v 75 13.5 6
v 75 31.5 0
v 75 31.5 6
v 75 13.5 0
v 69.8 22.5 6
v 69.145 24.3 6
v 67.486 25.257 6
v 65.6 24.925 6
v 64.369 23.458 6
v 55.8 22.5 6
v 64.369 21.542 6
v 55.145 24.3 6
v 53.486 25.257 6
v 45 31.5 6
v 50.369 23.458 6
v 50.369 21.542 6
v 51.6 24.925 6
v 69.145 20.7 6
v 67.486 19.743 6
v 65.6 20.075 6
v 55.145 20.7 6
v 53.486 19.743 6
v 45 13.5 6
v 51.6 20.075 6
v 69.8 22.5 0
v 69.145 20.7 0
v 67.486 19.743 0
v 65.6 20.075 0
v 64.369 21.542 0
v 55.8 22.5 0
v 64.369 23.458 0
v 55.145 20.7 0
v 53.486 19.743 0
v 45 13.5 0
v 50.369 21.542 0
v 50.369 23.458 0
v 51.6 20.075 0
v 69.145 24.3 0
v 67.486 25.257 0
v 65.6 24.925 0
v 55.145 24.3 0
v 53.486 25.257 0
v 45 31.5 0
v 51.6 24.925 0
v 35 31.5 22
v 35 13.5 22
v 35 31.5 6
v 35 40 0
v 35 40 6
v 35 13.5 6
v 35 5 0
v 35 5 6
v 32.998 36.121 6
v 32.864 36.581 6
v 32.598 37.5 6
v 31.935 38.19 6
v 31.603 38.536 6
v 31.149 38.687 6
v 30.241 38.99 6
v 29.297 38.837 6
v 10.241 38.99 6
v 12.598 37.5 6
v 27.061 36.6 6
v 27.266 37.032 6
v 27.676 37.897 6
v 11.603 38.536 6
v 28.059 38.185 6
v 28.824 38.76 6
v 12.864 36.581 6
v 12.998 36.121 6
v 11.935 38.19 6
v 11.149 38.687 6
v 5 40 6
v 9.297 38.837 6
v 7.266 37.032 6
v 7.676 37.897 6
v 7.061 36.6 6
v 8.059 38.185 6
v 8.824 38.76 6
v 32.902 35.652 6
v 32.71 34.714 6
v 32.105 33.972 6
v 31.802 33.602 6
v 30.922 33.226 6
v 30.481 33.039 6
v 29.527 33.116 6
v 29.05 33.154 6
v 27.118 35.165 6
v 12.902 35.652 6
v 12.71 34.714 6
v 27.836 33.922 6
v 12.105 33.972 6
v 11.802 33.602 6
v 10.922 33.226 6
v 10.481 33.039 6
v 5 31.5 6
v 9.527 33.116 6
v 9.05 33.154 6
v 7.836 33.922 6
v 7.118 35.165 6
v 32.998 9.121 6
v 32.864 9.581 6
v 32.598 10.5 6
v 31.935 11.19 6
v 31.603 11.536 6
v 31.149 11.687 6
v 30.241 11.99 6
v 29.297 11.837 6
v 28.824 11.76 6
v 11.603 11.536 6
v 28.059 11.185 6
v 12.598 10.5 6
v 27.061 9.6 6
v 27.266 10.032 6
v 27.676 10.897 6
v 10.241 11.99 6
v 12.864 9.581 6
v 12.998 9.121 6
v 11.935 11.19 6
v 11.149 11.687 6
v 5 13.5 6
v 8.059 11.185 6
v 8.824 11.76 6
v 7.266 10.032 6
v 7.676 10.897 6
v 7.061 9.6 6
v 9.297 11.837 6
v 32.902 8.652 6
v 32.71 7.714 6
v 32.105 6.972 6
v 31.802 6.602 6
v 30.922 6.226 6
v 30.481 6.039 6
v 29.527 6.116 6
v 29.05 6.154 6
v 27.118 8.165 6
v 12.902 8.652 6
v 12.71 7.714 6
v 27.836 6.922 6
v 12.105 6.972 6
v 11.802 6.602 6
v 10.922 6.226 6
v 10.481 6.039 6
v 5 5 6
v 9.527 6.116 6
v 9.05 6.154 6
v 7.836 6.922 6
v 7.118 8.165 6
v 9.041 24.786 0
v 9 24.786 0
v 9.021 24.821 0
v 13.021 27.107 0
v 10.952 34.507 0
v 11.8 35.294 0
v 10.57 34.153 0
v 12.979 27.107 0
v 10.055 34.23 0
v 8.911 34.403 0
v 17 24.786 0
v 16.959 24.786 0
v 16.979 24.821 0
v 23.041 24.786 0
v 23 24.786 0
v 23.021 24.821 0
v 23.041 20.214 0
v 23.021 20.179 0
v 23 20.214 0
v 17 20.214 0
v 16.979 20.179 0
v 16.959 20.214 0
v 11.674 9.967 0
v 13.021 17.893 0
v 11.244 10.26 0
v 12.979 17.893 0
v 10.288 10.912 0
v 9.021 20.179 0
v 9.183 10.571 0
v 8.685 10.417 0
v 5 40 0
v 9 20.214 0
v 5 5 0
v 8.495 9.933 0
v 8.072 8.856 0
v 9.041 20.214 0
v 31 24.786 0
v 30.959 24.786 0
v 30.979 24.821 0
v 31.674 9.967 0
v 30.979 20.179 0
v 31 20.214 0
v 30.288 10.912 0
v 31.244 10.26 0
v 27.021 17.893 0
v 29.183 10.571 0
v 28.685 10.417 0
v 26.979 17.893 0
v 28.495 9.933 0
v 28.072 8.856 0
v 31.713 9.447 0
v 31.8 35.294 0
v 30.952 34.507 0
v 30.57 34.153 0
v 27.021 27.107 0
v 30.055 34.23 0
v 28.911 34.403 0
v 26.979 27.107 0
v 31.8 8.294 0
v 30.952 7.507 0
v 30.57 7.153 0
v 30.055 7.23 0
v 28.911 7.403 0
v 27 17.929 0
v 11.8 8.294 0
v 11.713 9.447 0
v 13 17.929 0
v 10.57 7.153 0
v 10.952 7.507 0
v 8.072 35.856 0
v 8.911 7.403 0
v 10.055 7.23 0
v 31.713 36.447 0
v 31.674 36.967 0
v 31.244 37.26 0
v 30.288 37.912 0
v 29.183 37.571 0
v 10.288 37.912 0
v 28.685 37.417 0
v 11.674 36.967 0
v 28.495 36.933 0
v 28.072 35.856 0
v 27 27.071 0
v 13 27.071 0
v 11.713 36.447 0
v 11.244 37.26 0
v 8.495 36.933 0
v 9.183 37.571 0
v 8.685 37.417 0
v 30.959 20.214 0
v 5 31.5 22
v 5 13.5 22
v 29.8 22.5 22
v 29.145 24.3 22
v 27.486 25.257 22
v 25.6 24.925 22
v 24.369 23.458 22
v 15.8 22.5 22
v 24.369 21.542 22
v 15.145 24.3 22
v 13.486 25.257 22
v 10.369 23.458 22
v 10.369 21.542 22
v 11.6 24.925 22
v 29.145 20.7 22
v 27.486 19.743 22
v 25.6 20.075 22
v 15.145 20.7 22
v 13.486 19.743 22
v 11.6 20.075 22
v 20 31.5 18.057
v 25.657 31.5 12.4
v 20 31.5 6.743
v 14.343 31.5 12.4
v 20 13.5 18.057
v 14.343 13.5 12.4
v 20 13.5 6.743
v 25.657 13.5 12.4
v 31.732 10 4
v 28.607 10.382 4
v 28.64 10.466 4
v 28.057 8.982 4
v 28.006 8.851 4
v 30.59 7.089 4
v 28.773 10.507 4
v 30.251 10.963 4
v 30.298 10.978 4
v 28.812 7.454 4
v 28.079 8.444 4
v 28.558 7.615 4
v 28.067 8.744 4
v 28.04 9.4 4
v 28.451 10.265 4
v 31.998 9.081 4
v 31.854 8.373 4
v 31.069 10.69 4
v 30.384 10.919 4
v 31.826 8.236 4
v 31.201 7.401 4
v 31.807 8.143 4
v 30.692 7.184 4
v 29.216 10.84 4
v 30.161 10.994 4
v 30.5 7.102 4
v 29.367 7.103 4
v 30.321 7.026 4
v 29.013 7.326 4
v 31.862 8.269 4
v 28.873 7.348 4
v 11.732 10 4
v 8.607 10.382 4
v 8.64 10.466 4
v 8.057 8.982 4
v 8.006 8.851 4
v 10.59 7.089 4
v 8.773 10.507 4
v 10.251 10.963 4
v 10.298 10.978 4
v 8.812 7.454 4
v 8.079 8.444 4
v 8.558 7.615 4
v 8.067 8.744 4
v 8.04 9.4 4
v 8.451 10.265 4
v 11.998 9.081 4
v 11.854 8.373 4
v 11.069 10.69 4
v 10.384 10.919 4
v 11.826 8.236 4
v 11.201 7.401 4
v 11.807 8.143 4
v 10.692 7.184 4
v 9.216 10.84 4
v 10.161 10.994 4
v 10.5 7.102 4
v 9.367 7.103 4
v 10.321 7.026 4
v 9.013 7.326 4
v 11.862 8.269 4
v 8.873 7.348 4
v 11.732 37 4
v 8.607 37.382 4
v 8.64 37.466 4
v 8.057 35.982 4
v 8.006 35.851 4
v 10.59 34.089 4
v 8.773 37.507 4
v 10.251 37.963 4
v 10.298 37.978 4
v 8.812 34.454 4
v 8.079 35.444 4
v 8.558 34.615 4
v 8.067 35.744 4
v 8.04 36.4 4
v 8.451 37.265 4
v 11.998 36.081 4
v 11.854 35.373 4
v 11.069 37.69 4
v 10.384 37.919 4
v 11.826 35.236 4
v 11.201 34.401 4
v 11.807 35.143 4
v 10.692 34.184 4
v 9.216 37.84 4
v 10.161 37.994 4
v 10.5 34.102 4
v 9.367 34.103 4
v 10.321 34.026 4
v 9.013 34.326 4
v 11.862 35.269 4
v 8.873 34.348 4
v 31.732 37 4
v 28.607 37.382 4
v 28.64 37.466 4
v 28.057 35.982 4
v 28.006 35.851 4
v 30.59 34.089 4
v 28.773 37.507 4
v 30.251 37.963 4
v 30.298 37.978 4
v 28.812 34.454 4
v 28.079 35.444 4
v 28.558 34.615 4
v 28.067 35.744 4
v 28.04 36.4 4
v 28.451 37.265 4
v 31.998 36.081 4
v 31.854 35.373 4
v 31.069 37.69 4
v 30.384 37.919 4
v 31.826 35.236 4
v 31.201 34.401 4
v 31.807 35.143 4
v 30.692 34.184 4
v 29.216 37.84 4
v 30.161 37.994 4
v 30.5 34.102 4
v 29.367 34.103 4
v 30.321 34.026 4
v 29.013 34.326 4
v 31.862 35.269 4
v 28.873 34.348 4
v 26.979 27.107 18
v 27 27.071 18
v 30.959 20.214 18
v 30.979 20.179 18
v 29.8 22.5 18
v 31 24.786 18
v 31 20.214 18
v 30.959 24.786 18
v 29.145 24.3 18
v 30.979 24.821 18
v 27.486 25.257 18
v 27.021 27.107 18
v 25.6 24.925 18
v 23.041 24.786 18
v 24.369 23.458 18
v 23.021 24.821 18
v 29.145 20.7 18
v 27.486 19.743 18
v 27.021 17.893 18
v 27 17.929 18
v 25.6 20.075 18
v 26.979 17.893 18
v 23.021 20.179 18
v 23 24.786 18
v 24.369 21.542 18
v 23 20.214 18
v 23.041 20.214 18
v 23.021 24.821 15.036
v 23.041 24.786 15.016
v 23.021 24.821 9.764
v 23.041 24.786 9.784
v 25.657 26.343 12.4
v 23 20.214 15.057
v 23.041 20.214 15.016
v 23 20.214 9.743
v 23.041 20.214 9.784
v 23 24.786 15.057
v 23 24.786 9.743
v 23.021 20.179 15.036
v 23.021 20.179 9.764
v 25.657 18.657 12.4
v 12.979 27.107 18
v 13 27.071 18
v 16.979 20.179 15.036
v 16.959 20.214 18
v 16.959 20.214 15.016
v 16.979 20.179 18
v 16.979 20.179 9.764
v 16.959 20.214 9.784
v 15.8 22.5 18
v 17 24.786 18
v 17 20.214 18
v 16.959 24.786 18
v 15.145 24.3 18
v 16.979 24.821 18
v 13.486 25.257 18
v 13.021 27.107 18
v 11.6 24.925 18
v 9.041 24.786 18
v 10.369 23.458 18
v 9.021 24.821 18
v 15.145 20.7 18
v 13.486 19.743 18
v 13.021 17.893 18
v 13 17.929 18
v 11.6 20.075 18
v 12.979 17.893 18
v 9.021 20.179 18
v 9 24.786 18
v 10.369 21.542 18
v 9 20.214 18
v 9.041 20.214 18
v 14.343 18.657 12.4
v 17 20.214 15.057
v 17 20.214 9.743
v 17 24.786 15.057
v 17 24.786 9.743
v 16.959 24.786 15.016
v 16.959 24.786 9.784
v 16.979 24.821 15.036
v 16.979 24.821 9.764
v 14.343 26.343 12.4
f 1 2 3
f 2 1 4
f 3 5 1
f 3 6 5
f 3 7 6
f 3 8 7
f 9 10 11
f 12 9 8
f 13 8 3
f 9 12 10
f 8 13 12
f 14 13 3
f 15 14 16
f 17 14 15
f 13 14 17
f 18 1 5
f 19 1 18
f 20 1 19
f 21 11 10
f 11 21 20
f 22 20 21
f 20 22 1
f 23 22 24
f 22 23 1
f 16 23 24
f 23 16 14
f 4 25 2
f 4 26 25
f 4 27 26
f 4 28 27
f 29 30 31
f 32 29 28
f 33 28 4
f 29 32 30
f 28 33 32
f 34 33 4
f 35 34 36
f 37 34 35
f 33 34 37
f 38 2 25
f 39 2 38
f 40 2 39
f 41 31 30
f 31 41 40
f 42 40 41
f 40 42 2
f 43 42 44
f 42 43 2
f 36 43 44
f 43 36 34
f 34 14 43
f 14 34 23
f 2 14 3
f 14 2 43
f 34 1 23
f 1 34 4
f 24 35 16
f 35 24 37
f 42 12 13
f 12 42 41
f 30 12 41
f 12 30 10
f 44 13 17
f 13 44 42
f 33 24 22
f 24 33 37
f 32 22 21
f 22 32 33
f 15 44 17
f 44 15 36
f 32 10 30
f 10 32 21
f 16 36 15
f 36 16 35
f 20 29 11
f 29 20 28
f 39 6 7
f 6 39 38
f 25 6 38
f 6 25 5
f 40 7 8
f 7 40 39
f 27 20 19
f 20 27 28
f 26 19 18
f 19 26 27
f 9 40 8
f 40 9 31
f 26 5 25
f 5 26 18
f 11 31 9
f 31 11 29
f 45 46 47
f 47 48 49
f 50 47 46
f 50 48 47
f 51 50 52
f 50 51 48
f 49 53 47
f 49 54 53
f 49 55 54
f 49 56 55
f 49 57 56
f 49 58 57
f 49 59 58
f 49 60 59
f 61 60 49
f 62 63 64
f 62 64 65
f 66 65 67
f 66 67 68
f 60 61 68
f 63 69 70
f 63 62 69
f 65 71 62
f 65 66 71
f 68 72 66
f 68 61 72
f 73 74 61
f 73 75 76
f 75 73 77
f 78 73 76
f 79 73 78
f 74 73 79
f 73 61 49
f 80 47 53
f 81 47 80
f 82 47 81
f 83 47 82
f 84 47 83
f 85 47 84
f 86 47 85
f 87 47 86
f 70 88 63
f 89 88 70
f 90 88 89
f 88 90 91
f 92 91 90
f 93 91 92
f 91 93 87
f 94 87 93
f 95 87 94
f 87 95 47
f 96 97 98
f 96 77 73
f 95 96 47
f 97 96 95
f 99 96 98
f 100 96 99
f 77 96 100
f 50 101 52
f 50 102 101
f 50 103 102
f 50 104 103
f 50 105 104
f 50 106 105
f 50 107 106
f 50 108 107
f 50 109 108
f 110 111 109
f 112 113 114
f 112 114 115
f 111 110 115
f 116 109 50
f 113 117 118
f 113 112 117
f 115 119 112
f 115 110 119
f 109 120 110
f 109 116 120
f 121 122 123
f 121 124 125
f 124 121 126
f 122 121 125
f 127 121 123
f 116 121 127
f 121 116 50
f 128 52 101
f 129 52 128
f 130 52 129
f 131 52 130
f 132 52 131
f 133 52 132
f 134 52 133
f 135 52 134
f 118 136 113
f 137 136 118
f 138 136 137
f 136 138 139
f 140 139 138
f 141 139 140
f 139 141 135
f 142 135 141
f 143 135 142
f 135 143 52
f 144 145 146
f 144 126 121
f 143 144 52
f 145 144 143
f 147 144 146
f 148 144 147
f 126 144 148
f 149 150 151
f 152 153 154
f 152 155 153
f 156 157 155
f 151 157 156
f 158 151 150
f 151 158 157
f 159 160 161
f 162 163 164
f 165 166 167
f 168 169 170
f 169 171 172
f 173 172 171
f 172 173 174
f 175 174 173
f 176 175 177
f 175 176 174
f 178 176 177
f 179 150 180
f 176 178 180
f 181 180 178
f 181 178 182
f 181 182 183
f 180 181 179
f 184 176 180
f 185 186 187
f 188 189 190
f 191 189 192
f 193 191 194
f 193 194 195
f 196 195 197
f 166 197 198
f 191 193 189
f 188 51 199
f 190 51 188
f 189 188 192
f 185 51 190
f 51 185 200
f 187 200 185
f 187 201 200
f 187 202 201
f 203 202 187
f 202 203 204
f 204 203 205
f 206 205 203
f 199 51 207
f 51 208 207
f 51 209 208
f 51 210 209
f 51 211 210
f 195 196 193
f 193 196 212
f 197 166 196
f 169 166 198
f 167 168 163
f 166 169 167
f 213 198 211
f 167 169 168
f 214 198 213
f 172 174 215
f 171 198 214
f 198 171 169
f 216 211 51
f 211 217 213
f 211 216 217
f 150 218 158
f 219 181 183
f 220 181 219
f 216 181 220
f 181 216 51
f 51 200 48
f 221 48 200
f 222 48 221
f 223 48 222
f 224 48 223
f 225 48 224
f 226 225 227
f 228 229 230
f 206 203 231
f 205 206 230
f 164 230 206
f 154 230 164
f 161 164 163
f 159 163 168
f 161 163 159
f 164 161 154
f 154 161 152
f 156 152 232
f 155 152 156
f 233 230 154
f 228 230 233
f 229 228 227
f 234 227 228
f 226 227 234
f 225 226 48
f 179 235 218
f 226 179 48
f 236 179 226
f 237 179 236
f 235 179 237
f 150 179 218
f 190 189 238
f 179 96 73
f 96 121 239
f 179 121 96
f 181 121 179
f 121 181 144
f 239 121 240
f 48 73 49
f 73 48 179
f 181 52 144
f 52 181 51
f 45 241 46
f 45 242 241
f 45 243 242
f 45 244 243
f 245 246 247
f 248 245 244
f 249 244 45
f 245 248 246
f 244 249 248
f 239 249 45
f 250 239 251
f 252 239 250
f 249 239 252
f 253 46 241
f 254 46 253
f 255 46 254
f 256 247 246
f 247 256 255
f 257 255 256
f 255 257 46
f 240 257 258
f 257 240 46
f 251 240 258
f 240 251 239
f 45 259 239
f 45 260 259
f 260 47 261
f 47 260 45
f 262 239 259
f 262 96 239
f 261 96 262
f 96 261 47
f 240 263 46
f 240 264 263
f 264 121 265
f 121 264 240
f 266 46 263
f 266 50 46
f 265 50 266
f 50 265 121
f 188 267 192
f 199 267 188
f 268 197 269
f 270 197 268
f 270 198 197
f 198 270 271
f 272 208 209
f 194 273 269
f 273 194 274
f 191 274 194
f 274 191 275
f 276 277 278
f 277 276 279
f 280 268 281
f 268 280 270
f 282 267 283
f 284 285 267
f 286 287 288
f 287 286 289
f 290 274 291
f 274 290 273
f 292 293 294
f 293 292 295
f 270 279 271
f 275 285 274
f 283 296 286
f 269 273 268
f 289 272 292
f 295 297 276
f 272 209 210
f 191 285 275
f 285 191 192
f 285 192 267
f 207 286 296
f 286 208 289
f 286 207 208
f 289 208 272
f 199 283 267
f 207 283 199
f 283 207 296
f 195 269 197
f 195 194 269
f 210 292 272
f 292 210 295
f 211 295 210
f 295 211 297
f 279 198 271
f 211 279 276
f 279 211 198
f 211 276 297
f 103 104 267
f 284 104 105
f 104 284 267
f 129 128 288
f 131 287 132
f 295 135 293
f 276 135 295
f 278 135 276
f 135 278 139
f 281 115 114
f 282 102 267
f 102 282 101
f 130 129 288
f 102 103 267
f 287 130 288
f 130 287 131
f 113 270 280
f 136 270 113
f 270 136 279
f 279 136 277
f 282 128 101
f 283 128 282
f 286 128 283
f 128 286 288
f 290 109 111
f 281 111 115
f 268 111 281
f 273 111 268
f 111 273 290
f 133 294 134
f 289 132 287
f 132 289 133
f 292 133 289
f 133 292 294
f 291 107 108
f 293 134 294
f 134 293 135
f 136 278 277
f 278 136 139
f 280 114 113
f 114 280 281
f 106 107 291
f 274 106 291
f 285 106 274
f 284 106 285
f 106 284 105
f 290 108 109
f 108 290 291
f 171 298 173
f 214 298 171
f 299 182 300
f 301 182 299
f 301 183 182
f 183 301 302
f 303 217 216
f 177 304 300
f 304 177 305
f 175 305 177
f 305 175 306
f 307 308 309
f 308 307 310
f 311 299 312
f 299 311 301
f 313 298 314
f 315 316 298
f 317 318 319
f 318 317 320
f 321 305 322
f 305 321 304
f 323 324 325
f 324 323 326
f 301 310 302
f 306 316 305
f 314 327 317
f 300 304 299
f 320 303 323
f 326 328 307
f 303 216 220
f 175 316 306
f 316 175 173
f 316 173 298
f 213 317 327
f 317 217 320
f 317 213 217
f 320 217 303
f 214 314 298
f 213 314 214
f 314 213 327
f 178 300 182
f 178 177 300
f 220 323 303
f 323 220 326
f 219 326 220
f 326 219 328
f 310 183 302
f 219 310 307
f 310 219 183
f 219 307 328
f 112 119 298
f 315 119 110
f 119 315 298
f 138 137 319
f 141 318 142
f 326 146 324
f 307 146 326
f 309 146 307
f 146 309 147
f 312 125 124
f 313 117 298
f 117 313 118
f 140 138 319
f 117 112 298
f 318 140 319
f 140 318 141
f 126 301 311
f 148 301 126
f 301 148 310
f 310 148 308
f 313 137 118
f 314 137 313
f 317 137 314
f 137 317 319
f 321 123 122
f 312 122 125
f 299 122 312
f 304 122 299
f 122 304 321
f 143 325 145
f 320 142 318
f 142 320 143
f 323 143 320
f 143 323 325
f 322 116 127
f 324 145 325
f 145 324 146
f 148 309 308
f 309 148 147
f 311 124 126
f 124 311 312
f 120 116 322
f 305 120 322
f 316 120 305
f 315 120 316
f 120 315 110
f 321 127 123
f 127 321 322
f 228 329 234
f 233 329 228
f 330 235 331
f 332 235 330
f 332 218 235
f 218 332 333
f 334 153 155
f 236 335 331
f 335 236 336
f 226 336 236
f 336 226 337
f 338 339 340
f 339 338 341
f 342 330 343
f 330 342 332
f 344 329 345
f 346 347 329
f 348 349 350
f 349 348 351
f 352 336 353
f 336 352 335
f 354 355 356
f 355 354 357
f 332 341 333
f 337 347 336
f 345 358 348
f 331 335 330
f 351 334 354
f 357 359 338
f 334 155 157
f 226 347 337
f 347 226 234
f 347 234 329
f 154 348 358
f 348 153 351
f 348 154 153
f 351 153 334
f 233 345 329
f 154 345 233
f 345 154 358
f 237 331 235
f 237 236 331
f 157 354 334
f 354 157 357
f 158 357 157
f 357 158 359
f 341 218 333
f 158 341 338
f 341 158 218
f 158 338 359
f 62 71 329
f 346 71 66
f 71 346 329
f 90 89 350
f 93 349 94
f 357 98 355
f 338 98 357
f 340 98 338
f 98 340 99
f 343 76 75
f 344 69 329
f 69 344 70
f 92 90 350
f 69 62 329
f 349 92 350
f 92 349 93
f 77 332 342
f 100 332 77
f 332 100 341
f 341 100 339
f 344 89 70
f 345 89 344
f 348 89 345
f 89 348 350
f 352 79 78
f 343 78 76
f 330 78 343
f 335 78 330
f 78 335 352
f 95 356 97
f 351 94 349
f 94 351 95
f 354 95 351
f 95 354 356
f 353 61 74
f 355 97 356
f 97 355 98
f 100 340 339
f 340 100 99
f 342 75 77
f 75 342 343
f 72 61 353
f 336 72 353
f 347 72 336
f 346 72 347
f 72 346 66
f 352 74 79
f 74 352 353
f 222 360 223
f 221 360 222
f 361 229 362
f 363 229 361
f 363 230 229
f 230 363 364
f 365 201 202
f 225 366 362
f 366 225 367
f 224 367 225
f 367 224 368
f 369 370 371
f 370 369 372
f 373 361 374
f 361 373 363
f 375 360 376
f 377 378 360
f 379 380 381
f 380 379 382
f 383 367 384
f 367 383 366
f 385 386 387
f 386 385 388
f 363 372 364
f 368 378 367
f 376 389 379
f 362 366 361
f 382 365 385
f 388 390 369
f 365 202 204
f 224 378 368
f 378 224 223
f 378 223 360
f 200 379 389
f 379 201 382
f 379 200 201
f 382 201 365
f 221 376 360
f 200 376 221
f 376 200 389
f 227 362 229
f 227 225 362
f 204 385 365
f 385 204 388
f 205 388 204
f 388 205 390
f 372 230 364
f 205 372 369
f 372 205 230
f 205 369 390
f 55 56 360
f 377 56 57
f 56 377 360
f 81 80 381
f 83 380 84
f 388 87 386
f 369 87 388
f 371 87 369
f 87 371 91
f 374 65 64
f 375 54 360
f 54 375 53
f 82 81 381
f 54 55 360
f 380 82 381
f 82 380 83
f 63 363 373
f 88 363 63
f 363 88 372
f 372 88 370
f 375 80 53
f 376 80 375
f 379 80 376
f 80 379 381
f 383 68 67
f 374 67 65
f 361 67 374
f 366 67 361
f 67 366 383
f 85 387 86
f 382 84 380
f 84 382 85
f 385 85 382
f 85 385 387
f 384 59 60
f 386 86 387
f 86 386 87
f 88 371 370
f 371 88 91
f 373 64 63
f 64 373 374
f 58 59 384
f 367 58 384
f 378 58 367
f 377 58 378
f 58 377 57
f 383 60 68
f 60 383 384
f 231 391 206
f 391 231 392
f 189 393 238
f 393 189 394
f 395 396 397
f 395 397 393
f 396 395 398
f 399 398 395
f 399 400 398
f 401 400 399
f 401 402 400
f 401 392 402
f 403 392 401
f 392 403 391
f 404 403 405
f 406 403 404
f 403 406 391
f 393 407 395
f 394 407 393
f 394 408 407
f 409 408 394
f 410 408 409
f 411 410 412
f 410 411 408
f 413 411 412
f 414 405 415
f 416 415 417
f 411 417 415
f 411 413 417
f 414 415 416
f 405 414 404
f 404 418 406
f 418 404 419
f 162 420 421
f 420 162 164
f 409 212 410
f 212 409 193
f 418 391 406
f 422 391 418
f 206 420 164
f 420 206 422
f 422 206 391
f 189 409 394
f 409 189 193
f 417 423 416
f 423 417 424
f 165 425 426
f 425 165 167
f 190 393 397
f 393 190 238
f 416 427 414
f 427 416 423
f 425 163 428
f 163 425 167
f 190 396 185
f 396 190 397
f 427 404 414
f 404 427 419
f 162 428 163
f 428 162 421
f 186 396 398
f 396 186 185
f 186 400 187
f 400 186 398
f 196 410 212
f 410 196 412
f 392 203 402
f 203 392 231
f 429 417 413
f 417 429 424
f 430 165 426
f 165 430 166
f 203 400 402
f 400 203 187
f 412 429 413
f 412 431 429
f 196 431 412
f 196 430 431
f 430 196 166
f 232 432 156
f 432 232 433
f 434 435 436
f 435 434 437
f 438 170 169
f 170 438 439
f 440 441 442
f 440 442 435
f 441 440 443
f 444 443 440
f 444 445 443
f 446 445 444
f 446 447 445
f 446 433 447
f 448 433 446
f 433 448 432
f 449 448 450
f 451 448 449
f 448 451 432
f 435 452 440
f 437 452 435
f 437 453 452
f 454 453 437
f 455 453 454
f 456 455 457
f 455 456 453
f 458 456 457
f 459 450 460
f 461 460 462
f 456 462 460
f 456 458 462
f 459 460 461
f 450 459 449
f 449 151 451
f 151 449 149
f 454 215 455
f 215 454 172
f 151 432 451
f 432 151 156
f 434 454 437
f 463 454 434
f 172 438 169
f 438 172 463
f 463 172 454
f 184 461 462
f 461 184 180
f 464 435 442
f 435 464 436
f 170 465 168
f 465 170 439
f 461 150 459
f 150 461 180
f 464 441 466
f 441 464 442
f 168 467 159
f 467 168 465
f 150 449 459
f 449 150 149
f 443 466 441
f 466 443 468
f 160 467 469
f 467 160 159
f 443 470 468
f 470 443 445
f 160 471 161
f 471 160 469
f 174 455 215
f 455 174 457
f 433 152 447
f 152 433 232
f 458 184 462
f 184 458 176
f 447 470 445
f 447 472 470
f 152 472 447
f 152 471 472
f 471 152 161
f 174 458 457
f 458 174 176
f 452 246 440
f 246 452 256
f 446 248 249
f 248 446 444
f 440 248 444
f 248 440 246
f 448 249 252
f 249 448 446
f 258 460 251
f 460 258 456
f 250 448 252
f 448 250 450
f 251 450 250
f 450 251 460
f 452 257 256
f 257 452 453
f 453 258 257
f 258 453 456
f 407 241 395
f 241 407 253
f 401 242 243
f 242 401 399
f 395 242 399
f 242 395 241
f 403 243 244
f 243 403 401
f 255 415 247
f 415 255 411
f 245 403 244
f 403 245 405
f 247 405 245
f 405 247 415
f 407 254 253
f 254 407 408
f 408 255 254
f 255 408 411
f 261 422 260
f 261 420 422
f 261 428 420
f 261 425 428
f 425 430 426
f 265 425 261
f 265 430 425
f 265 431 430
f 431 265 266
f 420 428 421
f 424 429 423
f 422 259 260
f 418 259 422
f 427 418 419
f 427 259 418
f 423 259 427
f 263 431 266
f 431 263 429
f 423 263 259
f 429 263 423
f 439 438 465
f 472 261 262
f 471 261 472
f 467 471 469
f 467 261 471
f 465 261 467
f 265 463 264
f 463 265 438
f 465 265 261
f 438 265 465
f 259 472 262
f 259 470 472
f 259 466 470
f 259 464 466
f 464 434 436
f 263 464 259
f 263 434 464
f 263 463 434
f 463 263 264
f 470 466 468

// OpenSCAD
// 
/*
 *  OpenSCAD Shapes Library (www.openscad.at)
 *  Foot for Mendel Y platform
 *  by Vik Olliver. Based on examples which are:
 *  Copyright (C) 2009  Catarina Mota <clifford@clifford.at>
 *
 *  This program is free software; you can redistribute it and/or modify
 *  it under the terms of the GNU General Public License as published by
 *  the Free Software Foundation; either version 2 of the License, or
 *  (at your option) any later version.
 *
 *  This program is distributed in the hope that it will be useful,
 *  but WITHOUT ANY WARRANTY; without even the implied warranty of
 *  MERCHANTABILITY or FITNESS FOR A PARTICULAR PURPOSE.  See the
 *  GNU General Public License for more details.
 *
 *  You should have received a copy of the GNU General Public License
 *  along with this program; if not, write to the Free Software
 *  Foundation, Inc., 59 Temple Place, Suite 330, Boston, MA  02111-1307  USA
 *
*/

m4_clearance_rad=2.8;
m6_clearance_rad=3.7;
m8_clearance_rad=4.7;


post_wid=20;

module box(w,h,d) {
	scale ([w,h,d]) cube(1, true);
}

module roundedBox(w,h,d,f){
	difference(){
		box(w,h,d);
		translate([-w/2,h/2,0]) cube(w/(f/2),true);
		translate([w/2,h/2,0]) cube(w/(f/2),true);
		translate([-w/2,-h/2,0]) cube(w/(f/2),true);
		translate([w/2,-h/2,0]) cube(w/(f/2),true);
	}
	translate([-w/2+w/f,h/2-w/f,-d/2]) cylinder(d,w/f, w/f);
	translate([w/2-w/f,h/2-w/f,-d/2]) cylinder(d,w/f, w/f);
	translate([-w/2+w/f,-h/2+w/f,-d/2]) cylinder(d,w/f, w/f);
	translate([w/2-w/f,-h/2+w/f,-d/2]) cylinder(d,w/f, w/f);
}
module hexagon(height, depth) {
	boxWidth=height/1.75;
		union(){
			box(boxWidth, height, depth);
			rotate([0,0,60]) box(boxWidth, height, depth);
			rotate([0,0,-60]) box(boxWidth, height, depth);
		}
}

module m4_hole_horiz(l) {
	cylinder(l,m4_clearance_rad,m4_clearance_rad,center=true);
	translate ([m4_clearance_rad*0.6,0,0]) rotate ([0,0,45])
		cube([m4_clearance_rad,m4_clearance_rad,l],center=true);
}

module m4_hole_vert(l) {
	cylinder(l,m4_clearance_rad,m4_clearance_rad,center=true);
}

module m6_hole_horiz(l) {
	cylinder(l,m6_clearance_rad,m6_clearance_rad,center=true);
	translate ([m6_clearance_rad*0.6,0,0]) rotate ([0,0,45])
		cube([m6_clearance_rad,m6_clearance_rad,l],center=true);
}
module m8_hole_horiz(l) {
	cylinder(l,m8_clearance_rad,m8_clearance_rad,center=true);
	translate ([m8_clearance_rad*0.6,0,0]) rotate ([0,0,45])
		cube([m8_clearance_rad,m8_clearance_rad,l],center=true);
}

// No .4 3/4 inch countersunk woodscrew (includes a lot of headspace)
module small_woodscrew() {
	rotate ([0,0,30]) {
		translate ([0,0,-7.5]) cylinder(h=3,r1=0.2,r2=1.8,center=true);
		cylinder(h=12,r1=1.8,r2=2.0,center=true);
		translate([0,0,6]) cylinder(h=4, r1=2.0, r2=4.0);
	}
}

clamp_len=35;
clamp_top_len=18;
clamp_base_thick=6;
clamp_height=22;
clamp_thick=30;
clamp_hole_spacing=14;
cutout_size=8;

// The big bit of the clamp.
module clamp_main() {
	difference() {
		union () {
			// Basic T shape
			translate ([0,0,clamp_base_thick/2]) box(clamp_thick,clamp_len,clamp_base_thick);
			translate ([0,0,clamp_height/2]) box(clamp_thick,clamp_top_len,clamp_height);
		}
		// Holes for countersunk screws.
		translate ([clamp_thick/2-5,4-clamp_len/2,-2]) small_woodscrew();
		translate ([5-clamp_thick/2,4-clamp_len/2,-2]) small_woodscrew();
		translate ([5-clamp_thick/2,clamp_len/2-4,-2]) small_woodscrew();
		translate ([clamp_thick/2-5,clamp_len/2-4,-2]) small_woodscrew();
		// Cavities for M4 clamp nuts. Yeah this overhangs. So what? it works.
		translate ([clamp_hole_spacing/2,0,0]) rotate([0,0,30]) hexagon(height=8,depth=(clamp_height-4)*2);
		translate ([-clamp_hole_spacing/2,0,0])  rotate([0,0,30])hexagon(height=8,depth=(clamp_height-4)*2);
		// Cavities for M4 bolts.
		translate ([-clamp_hole_spacing/2,0,0]) m4_hole_vert(clamp_height*3);
		translate ([clamp_hole_spacing/2,0,0]) m4_hole_vert(clamp_height*3);
		// Big hole in case you need to fiddle with your nuts.
		translate ([0,0,cutout_size*0.8+clamp_base_thick]) rotate ([0,45,0]) box(cutout_size,clamp_len,cutout_size);
	}
}

// Little crosspiece of clamp
module clamp_crosspiece() {
	difference() {
		translate ([0,0,clamp_base_thick/2]) box(clamp_thick,clamp_top_len,clamp_base_thick);
		// Cavities for M4 bolts.
		translate ([-clamp_hole_spacing/2,0,0]) m4_hole_vert(clamp_height*3);
		translate ([clamp_hole_spacing/2,0,0]) m4_hole_vert(clamp_height*3);
	}
}

translate ([0,clamp_len/2+5,0]) {
	translate ([clamp_thick*2,0,0]) clamp_crosspiece();
	translate ([clamp_thick*0.5+5,0,0]) clamp_main();
}
